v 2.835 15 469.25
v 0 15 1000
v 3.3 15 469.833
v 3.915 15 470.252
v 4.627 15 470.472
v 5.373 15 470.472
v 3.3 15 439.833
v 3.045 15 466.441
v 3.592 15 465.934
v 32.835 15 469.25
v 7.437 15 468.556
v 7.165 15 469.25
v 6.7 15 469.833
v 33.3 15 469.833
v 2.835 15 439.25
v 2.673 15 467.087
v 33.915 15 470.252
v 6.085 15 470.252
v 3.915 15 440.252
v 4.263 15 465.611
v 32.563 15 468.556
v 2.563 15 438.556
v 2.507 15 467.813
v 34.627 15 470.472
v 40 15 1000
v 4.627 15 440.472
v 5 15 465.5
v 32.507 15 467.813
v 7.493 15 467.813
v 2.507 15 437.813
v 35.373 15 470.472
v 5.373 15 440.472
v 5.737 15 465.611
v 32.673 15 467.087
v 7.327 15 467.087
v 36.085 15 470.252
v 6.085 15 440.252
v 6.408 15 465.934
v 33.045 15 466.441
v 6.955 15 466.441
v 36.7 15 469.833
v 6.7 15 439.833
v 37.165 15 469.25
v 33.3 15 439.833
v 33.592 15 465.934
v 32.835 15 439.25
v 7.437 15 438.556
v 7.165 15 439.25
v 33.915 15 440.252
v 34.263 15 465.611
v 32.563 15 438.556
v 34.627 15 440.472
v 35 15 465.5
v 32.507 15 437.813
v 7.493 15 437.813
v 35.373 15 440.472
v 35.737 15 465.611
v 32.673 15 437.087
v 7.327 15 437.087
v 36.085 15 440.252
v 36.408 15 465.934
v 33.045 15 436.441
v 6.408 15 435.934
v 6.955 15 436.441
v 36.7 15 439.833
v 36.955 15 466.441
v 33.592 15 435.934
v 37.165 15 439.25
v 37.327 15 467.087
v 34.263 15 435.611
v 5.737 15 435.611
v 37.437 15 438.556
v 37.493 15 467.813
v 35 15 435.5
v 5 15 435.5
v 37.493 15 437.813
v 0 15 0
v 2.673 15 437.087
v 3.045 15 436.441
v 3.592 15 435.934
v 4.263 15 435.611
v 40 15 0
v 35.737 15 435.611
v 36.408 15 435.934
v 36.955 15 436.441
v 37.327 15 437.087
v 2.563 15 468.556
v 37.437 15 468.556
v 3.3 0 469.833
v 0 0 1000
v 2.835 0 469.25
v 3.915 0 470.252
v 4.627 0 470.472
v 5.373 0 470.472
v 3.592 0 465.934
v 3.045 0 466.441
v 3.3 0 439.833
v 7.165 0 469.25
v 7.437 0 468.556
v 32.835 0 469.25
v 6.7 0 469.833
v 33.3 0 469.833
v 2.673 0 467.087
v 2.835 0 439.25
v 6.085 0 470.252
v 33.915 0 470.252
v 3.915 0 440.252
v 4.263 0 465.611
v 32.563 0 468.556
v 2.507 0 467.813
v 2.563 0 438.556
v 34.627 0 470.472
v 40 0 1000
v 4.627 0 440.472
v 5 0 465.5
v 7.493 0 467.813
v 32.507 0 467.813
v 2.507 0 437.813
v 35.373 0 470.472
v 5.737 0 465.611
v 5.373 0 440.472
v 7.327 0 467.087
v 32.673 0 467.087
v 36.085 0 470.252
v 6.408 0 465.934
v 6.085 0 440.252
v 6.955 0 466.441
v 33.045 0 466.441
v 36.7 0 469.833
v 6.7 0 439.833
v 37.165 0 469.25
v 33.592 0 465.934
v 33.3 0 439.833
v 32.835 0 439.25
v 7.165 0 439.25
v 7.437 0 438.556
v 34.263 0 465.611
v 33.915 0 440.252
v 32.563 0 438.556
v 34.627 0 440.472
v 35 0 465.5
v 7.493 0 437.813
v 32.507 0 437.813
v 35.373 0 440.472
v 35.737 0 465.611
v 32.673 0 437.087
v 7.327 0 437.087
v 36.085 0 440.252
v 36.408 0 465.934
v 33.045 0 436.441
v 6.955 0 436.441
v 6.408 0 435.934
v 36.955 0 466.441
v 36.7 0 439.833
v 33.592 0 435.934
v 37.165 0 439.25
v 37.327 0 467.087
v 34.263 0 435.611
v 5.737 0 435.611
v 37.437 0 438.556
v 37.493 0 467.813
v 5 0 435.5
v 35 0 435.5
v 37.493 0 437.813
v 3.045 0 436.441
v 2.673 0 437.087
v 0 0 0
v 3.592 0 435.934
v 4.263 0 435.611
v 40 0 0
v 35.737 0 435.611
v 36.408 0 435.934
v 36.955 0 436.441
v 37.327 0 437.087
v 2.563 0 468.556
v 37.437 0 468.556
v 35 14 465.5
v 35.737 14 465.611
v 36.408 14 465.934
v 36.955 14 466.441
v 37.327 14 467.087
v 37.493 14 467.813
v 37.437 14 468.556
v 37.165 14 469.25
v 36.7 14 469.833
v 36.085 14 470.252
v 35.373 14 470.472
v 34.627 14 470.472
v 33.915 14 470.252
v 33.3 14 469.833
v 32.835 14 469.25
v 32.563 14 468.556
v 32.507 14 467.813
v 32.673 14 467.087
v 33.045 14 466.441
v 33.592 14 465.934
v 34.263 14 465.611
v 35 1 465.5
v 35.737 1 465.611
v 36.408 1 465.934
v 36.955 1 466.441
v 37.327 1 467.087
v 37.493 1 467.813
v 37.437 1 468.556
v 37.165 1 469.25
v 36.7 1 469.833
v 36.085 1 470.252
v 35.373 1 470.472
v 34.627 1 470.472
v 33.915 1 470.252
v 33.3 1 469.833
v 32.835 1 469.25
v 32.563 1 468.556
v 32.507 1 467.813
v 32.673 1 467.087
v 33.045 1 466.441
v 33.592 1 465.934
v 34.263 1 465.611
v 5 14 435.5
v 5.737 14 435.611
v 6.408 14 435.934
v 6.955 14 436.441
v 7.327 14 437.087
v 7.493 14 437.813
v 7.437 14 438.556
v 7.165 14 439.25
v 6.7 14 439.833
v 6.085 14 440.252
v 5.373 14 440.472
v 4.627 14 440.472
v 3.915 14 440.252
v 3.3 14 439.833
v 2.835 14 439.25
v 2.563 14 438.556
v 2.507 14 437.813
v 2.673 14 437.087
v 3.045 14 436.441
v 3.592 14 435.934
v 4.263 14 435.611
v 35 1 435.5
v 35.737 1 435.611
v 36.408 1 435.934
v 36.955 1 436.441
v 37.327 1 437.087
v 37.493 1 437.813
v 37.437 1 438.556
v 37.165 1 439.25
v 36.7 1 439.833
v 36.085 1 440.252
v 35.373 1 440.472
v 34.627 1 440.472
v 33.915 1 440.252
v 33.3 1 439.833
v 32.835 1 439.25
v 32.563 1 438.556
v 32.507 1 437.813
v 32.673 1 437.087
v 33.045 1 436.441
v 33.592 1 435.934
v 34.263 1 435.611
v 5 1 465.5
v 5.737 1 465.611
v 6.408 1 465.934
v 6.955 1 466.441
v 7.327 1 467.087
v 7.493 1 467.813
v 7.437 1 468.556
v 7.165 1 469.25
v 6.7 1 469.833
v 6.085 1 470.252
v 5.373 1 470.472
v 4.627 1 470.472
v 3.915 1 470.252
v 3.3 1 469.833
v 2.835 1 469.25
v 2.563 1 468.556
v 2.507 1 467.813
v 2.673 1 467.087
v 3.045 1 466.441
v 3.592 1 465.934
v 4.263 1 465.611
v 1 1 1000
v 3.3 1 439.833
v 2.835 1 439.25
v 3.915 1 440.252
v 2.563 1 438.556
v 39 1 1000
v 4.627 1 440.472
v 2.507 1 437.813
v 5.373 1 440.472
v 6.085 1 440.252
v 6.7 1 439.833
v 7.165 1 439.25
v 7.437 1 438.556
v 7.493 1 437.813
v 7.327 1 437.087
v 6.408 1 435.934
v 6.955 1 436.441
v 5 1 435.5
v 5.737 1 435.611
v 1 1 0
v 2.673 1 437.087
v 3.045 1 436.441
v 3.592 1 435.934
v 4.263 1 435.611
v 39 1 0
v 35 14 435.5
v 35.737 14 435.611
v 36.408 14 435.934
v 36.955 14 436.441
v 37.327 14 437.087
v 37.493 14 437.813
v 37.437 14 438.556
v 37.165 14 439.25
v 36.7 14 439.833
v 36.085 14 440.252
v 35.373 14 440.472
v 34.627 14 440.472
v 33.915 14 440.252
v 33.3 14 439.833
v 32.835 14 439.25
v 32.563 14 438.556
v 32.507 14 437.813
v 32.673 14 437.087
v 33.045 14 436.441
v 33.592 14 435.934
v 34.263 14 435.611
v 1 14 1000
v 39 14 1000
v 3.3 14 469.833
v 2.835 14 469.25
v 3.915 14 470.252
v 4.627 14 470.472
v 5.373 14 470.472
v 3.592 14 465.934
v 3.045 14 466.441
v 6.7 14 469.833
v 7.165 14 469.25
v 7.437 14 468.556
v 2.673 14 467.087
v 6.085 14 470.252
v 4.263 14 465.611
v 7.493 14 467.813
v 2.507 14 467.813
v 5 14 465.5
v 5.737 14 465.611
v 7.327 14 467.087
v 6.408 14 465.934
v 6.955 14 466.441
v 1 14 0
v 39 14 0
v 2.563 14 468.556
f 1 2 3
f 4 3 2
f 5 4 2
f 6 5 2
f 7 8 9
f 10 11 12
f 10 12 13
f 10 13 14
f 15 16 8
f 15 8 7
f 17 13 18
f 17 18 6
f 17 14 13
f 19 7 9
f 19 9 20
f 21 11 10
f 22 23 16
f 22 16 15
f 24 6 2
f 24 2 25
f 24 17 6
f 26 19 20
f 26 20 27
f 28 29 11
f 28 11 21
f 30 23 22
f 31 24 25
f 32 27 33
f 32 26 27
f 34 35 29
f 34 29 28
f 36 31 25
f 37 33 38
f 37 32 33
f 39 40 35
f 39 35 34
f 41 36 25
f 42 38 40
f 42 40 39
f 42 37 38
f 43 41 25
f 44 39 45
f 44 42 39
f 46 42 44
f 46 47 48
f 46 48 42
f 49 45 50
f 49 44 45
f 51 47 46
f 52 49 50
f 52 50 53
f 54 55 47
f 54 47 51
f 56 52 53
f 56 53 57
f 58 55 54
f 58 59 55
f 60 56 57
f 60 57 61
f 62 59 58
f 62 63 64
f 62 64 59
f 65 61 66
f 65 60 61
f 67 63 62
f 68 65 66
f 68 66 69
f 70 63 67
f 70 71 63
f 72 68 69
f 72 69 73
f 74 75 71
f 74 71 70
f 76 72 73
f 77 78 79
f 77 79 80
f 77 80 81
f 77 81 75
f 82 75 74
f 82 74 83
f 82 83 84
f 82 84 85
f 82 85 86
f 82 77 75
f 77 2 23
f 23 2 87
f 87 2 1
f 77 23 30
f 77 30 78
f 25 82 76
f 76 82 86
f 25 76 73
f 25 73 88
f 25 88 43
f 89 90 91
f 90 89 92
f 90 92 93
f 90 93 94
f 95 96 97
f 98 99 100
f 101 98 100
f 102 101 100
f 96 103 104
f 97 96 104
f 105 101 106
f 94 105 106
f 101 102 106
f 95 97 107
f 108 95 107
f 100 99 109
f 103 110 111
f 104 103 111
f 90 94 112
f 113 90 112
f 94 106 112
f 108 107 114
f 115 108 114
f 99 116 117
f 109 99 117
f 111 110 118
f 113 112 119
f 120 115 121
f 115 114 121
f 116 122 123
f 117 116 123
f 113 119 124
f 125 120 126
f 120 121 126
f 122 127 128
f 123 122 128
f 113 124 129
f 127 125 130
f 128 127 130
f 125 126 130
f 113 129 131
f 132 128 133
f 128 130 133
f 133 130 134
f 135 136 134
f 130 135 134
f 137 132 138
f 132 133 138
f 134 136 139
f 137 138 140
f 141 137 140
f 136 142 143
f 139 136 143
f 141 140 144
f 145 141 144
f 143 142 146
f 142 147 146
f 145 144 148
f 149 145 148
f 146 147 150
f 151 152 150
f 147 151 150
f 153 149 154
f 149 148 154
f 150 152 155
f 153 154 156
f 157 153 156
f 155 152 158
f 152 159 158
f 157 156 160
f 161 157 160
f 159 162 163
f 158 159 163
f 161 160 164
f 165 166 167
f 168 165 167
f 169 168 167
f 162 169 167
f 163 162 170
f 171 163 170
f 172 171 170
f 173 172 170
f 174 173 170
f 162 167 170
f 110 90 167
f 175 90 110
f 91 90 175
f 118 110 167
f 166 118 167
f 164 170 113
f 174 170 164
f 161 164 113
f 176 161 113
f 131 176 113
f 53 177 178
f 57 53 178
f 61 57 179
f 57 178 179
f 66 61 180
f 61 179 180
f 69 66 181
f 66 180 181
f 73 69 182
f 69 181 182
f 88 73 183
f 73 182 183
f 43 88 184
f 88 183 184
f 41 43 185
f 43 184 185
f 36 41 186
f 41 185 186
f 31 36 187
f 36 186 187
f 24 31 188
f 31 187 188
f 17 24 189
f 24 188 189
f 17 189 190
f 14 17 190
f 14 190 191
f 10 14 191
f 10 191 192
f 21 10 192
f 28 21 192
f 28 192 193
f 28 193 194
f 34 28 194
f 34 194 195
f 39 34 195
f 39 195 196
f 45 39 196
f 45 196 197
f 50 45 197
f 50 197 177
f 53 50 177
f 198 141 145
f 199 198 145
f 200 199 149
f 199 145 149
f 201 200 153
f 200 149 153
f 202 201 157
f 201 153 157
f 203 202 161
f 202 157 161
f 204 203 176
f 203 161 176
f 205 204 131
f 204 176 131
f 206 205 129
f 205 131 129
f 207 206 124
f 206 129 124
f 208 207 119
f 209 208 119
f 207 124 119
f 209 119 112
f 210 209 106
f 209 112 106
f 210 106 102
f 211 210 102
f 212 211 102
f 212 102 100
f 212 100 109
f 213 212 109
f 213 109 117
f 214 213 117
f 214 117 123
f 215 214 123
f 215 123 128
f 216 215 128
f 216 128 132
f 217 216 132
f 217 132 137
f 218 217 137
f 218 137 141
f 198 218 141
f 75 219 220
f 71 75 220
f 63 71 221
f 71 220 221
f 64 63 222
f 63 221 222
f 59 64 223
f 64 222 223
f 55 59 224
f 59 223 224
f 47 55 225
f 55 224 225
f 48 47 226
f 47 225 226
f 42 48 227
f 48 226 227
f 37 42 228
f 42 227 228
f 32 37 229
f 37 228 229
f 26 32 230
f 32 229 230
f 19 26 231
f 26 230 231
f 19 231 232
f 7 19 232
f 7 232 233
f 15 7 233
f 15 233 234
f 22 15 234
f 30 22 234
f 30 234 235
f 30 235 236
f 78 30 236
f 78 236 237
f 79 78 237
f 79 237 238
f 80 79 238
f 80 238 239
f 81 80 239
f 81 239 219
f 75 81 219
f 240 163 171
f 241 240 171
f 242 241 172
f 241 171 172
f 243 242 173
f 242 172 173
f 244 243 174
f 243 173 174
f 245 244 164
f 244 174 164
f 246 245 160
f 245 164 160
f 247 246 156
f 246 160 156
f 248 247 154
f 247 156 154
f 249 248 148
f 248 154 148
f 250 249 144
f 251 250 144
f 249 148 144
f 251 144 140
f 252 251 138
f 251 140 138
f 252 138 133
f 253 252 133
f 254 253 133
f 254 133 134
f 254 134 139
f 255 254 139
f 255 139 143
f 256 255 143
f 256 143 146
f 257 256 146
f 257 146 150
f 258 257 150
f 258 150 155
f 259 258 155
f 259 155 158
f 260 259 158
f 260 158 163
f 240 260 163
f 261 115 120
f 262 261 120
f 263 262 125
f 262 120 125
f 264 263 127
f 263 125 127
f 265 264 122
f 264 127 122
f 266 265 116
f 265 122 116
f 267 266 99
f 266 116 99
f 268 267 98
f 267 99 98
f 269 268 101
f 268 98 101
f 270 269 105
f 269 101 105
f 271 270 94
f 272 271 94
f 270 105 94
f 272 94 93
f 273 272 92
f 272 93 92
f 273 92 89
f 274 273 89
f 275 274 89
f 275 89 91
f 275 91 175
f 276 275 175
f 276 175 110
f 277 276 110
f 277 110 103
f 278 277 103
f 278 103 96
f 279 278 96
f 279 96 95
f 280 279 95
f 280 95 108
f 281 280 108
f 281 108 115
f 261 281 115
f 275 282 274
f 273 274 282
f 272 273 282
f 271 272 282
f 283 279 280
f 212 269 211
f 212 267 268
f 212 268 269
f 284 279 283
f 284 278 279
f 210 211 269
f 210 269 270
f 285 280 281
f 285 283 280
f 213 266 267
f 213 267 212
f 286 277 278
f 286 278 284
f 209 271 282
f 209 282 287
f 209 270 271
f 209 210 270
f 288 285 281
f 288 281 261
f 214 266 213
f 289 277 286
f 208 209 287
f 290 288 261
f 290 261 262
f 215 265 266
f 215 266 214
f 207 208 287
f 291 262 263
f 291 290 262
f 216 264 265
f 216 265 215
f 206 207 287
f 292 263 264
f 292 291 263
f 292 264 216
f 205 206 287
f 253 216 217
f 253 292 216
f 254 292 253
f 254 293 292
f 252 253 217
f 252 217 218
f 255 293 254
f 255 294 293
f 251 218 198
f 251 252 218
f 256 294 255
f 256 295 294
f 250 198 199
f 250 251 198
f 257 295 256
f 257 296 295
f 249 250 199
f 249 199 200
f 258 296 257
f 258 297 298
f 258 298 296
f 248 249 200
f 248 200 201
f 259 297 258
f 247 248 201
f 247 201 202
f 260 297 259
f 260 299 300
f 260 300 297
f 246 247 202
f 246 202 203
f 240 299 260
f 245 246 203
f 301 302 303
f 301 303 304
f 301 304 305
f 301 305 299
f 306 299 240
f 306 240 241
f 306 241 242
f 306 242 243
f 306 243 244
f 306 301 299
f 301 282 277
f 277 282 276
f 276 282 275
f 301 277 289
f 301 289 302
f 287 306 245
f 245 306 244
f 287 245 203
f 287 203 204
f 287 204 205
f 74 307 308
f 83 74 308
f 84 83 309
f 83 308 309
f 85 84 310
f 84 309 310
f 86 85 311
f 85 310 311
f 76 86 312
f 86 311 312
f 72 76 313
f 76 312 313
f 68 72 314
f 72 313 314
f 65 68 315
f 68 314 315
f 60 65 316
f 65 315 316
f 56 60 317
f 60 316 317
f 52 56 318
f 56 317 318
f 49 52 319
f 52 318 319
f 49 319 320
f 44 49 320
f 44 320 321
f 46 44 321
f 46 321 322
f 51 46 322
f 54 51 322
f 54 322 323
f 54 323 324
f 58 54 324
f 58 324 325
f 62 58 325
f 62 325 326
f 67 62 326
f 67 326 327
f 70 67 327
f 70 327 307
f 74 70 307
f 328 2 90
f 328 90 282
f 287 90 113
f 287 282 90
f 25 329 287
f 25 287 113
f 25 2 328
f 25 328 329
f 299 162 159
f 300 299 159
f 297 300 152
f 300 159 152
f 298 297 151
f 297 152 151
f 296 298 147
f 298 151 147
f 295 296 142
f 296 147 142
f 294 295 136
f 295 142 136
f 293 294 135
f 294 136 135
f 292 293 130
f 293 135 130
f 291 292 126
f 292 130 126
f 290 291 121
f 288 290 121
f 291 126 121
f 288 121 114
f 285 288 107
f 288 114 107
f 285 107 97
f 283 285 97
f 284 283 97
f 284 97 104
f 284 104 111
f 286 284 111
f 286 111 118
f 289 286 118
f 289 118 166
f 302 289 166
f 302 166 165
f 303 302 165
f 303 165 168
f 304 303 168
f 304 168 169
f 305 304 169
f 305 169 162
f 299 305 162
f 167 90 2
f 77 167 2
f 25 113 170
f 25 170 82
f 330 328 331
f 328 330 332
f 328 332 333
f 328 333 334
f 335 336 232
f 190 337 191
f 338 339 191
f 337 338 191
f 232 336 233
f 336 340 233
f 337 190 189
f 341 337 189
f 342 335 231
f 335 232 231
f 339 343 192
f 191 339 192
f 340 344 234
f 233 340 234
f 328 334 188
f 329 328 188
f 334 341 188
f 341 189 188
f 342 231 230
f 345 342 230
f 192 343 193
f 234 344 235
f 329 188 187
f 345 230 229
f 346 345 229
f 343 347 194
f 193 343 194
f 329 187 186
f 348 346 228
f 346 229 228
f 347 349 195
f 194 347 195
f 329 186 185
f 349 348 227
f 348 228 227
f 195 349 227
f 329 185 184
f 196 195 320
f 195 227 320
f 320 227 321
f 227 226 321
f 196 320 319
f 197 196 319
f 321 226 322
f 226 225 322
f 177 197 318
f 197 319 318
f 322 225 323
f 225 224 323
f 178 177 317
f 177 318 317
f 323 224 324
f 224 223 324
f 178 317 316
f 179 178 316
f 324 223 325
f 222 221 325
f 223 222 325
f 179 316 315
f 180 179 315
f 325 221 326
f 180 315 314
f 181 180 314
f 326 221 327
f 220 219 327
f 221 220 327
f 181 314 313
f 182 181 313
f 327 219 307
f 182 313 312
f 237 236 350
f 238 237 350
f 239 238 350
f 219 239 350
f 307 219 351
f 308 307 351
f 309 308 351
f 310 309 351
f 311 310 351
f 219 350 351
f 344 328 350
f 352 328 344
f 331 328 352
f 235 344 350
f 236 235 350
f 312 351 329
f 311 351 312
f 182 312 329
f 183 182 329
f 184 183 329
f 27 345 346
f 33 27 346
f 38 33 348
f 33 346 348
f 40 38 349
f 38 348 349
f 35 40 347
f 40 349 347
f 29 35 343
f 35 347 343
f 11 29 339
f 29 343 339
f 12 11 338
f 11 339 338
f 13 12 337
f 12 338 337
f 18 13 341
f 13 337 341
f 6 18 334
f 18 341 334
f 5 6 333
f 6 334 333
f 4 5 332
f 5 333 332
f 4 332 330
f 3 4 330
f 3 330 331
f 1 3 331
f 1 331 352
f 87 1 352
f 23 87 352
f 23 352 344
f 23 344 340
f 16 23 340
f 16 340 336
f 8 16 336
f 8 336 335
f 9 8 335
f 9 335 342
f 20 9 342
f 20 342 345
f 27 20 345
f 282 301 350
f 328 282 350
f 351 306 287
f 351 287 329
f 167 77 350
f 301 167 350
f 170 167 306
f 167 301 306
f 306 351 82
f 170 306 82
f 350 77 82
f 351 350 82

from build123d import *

# Parameters (mm, degrees)
SKETCH_1_W          = 40
SKETCH_1_H          = 15
SKETCH_1_W_2        = 38
SKETCH_1_H_2        = 13
EXTRUDE_1_DEPTH     = 1000
SKETCH_3_R          = 2.5
CUT_EXTRUDE_2_DEPTH = 1001.912084051


with BuildPart() as part:
    # 草图1 → 凸台-拉伸1 (new body)
    with BuildSketch(Plane.XY):
        with Locations((20, 7.5)):
            Rectangle(SKETCH_1_W, SKETCH_1_H)
        with Locations((20, 7.5)):
            Rectangle(SKETCH_1_W_2, SKETCH_1_H_2, mode=Mode.SUBTRACT)
    extrude(amount=EXTRUDE_1_DEPTH)

    # 草图3 → 切除-拉伸2 (cut, through all)
    with BuildSketch(Plane.XZ):
        with Locations(Location((35, 468, 0), (0, 0, 270))):
            Circle(SKETCH_3_R)
        with Locations(Location((35, 438, 0), (0, 0, 270))):
            Circle(SKETCH_3_R)
        with Locations(Location((5, 468, 0), (0, 0, 270))):
            Circle(SKETCH_3_R)
        with Locations(Location((5, 438, 0), (0, 0, 270))):
            Circle(SKETCH_3_R)
    extrude(amount=-CUT_EXTRUDE_2_DEPTH, mode=Mode.SUBTRACT)


solid = part.part
